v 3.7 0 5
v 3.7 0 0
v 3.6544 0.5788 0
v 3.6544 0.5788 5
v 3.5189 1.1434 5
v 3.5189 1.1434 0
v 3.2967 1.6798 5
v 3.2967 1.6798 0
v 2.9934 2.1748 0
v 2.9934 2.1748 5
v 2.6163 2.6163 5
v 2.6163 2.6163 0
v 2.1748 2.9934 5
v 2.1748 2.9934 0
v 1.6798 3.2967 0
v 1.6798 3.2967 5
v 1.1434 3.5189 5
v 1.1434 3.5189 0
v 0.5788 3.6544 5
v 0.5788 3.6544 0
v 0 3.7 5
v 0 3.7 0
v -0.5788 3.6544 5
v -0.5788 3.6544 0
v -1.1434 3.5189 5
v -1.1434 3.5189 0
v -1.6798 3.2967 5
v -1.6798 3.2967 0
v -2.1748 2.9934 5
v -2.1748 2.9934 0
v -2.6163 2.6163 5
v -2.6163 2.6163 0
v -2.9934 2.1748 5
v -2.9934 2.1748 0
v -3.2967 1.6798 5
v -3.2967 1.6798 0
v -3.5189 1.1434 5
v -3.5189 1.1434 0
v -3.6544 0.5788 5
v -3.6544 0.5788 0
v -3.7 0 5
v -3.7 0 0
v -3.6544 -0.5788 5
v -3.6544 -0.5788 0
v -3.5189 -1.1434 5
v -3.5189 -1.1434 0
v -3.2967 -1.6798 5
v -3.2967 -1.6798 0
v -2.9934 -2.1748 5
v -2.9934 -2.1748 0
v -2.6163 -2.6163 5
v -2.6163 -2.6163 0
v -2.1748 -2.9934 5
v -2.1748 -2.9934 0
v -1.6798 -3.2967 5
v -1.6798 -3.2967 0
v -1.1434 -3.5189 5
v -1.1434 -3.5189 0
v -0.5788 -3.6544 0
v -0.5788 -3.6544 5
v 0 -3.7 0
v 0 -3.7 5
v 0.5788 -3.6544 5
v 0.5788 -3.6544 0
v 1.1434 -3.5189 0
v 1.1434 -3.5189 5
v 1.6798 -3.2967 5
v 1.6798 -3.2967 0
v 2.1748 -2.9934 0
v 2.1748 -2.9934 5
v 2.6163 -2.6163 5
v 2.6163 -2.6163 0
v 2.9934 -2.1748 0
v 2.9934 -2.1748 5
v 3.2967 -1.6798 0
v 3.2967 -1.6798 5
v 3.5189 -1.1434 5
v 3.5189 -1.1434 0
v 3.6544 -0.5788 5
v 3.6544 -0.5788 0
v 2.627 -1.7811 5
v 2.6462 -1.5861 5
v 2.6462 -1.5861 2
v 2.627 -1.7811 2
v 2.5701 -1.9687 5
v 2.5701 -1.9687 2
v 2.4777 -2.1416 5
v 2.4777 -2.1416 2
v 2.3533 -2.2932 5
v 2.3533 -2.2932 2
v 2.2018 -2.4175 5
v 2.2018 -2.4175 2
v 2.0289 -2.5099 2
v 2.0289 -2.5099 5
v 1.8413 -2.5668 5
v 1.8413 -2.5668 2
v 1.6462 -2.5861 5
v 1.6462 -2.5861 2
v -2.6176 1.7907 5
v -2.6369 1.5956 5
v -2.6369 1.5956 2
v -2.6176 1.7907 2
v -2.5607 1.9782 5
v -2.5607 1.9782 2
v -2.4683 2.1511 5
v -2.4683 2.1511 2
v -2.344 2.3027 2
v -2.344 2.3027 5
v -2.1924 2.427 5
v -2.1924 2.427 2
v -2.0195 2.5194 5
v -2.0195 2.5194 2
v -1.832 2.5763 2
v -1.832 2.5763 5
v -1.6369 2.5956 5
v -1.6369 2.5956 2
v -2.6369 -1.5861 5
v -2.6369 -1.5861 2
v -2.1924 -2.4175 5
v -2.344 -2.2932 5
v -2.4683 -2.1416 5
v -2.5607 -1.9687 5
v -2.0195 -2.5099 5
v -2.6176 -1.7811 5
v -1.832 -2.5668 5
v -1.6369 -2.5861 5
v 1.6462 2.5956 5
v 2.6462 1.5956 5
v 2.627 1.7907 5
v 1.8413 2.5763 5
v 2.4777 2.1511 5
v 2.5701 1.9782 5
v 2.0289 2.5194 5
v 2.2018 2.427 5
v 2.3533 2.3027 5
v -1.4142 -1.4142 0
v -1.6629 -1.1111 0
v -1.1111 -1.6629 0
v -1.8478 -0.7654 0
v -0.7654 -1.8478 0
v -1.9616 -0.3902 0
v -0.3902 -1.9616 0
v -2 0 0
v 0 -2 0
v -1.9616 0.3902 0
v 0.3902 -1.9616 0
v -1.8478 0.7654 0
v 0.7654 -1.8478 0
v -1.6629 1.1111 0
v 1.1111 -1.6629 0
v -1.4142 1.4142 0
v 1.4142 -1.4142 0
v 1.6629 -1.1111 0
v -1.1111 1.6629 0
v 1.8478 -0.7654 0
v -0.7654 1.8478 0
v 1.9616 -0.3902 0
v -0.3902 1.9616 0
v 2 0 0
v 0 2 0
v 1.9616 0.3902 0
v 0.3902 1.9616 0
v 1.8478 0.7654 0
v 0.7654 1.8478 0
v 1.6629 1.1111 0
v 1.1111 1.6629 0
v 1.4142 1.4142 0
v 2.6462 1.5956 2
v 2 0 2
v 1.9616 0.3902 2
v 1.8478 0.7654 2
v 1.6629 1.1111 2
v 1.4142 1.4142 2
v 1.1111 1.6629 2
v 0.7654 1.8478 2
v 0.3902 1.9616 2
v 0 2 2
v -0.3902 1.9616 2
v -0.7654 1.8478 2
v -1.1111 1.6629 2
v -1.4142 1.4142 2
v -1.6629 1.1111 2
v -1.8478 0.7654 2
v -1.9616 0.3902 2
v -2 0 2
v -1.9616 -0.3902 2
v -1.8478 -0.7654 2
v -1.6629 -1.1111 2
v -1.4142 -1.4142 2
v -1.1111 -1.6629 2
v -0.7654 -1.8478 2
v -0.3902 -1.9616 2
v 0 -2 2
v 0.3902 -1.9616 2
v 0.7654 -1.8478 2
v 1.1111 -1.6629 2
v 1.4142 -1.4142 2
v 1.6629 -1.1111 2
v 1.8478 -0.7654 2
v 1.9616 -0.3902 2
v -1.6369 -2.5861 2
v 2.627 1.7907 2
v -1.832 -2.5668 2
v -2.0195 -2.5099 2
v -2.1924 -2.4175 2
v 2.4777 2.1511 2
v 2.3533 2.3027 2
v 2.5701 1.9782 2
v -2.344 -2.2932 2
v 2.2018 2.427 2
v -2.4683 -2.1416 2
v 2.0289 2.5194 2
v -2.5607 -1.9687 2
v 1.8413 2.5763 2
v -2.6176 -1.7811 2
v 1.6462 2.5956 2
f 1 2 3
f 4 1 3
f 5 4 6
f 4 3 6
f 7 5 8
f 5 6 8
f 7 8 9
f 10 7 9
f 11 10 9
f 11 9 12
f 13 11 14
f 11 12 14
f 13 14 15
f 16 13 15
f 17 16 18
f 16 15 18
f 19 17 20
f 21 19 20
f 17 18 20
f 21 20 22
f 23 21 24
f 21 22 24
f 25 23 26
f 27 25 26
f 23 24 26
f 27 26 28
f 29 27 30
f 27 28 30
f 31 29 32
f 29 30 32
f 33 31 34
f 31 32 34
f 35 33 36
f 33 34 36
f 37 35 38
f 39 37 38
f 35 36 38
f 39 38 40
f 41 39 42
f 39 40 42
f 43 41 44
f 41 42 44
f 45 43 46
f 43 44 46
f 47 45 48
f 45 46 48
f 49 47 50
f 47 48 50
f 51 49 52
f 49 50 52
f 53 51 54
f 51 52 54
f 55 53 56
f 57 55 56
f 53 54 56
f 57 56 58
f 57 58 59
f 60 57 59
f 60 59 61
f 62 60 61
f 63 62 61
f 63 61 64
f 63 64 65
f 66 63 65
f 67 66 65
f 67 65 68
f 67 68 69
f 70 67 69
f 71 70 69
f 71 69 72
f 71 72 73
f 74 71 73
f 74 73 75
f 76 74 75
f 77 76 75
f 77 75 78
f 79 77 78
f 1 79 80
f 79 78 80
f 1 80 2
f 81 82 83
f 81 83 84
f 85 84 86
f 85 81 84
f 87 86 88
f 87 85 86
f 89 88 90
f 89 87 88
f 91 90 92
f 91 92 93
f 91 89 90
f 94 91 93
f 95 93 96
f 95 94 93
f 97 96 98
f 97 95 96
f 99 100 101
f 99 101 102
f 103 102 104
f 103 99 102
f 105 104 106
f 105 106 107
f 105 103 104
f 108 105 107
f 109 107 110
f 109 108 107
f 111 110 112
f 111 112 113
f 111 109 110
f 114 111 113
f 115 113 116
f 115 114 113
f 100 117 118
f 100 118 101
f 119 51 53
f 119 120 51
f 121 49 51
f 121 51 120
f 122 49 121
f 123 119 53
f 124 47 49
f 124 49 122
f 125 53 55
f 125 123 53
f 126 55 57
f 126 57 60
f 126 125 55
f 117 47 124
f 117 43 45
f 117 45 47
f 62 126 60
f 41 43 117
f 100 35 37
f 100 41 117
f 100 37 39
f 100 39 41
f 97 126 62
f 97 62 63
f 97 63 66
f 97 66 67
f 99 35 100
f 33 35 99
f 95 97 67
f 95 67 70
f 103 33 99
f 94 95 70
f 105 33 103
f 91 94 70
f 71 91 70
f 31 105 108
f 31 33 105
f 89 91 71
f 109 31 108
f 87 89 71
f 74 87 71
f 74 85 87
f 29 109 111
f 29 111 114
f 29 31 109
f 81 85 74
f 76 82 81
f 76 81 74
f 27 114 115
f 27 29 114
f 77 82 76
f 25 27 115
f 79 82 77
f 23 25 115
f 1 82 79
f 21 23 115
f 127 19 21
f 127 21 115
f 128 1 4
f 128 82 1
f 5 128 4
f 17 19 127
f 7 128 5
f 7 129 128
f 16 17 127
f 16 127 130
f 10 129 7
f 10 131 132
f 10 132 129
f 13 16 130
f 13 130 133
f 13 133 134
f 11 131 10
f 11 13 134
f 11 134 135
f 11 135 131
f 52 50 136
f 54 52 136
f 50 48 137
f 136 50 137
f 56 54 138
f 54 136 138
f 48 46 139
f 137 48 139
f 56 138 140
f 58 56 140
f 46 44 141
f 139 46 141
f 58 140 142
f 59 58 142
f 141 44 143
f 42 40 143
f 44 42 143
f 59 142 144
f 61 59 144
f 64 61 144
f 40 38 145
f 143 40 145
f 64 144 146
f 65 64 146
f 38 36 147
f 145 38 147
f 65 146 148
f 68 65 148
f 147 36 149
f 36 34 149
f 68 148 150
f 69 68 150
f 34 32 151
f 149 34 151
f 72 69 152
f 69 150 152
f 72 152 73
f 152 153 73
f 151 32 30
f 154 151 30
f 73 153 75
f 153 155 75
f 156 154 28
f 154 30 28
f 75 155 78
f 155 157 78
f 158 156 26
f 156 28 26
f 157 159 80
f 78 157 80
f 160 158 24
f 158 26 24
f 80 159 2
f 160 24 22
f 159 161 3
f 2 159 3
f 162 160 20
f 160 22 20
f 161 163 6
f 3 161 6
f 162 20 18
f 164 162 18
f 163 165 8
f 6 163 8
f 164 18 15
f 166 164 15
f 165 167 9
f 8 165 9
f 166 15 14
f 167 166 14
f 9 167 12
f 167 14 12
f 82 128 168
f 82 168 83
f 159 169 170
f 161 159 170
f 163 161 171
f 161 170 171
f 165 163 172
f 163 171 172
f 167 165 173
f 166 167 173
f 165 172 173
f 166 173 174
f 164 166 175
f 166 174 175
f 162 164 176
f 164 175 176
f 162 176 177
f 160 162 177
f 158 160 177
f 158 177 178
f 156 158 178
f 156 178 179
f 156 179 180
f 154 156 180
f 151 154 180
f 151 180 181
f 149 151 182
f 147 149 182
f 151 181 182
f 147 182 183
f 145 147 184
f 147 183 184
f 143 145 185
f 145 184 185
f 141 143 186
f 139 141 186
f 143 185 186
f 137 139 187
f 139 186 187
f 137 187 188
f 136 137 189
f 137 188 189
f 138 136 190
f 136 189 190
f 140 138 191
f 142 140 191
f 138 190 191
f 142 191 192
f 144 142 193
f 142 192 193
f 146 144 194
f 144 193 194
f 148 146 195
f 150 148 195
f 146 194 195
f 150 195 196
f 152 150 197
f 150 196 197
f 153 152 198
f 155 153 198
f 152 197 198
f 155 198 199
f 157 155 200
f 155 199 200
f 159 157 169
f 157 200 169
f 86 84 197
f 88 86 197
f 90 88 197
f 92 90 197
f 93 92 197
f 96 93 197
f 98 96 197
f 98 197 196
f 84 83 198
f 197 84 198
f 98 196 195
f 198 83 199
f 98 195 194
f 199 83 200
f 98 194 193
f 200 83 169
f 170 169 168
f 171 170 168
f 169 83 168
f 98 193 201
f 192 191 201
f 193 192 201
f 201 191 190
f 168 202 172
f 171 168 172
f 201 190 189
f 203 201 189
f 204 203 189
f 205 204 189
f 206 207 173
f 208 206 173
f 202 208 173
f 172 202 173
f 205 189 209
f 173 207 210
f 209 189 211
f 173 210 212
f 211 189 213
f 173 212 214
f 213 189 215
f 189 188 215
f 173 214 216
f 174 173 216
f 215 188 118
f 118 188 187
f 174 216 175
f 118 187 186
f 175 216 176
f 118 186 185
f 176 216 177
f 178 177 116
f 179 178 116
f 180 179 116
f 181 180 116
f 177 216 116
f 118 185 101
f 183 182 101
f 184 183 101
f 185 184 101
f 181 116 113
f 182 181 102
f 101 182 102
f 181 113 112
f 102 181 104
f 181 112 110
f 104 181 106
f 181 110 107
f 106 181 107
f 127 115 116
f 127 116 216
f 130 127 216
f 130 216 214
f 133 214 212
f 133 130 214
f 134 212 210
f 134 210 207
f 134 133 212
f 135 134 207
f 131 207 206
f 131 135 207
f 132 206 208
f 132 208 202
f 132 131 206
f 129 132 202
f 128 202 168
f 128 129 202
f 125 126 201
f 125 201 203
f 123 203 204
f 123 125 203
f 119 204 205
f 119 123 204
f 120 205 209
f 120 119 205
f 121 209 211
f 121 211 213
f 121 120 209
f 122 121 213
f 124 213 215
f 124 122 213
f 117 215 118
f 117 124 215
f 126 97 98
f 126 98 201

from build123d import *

# Parameters (mm, degrees)
SKETCH_1_R          = 3.7
EXTRUDE_1_DEPTH     = 5
CUT_EXTRUDE_1_DEPTH = 3
SKETCH_3_R          = 2
CUT_EXTRUDE_2_DEPTH = 2


with BuildPart() as part:
    # 草图1 → 凸台-拉伸1 (new body)
    with BuildSketch(Plane.XY):
        Circle(SKETCH_1_R)
    extrude(amount=EXTRUDE_1_DEPTH)

    # 草图2 → 切除-拉伸1 (cut)
    with BuildSketch(Plane.XY.offset(5)):
        with BuildLine():
            Line((-1.636863732, 2.595563457), (1.646192649, 2.595563457))
            ThreePointArc((1.646192649, 2.595563457), (2.35329943, 2.302670238), (2.646192649, 1.595563457))
            Line((2.646192649, 1.595563457), (2.646192649, -1.586051907))
            ThreePointArc((2.646192649, -1.586051907), (2.35329943, -2.293158688), (1.646192649, -2.586051907))
            Line((1.646192649, -2.586051907), (-1.636863732, -2.586051907))
            ThreePointArc((-1.636863732, -2.586051907), (-2.343970513, -2.293158688), (-2.636863732, -1.586051907))
            Line((-2.636863732, -1.586051907), (-2.636863732, 1.595563457))
            ThreePointArc((-2.636863732, 1.595563457), (-2.343970513, 2.302670238), (-1.636863732, 2.595563457))
        make_face()
    extrude(amount=-CUT_EXTRUDE_1_DEPTH, mode=Mode.SUBTRACT)

    # 草图3 → 切除-拉伸2 (cut)
    with BuildSketch(Plane.XY.offset(2)):
        Circle(SKETCH_3_R)
    extrude(amount=-CUT_EXTRUDE_2_DEPTH, mode=Mode.SUBTRACT)


solid = part.part
